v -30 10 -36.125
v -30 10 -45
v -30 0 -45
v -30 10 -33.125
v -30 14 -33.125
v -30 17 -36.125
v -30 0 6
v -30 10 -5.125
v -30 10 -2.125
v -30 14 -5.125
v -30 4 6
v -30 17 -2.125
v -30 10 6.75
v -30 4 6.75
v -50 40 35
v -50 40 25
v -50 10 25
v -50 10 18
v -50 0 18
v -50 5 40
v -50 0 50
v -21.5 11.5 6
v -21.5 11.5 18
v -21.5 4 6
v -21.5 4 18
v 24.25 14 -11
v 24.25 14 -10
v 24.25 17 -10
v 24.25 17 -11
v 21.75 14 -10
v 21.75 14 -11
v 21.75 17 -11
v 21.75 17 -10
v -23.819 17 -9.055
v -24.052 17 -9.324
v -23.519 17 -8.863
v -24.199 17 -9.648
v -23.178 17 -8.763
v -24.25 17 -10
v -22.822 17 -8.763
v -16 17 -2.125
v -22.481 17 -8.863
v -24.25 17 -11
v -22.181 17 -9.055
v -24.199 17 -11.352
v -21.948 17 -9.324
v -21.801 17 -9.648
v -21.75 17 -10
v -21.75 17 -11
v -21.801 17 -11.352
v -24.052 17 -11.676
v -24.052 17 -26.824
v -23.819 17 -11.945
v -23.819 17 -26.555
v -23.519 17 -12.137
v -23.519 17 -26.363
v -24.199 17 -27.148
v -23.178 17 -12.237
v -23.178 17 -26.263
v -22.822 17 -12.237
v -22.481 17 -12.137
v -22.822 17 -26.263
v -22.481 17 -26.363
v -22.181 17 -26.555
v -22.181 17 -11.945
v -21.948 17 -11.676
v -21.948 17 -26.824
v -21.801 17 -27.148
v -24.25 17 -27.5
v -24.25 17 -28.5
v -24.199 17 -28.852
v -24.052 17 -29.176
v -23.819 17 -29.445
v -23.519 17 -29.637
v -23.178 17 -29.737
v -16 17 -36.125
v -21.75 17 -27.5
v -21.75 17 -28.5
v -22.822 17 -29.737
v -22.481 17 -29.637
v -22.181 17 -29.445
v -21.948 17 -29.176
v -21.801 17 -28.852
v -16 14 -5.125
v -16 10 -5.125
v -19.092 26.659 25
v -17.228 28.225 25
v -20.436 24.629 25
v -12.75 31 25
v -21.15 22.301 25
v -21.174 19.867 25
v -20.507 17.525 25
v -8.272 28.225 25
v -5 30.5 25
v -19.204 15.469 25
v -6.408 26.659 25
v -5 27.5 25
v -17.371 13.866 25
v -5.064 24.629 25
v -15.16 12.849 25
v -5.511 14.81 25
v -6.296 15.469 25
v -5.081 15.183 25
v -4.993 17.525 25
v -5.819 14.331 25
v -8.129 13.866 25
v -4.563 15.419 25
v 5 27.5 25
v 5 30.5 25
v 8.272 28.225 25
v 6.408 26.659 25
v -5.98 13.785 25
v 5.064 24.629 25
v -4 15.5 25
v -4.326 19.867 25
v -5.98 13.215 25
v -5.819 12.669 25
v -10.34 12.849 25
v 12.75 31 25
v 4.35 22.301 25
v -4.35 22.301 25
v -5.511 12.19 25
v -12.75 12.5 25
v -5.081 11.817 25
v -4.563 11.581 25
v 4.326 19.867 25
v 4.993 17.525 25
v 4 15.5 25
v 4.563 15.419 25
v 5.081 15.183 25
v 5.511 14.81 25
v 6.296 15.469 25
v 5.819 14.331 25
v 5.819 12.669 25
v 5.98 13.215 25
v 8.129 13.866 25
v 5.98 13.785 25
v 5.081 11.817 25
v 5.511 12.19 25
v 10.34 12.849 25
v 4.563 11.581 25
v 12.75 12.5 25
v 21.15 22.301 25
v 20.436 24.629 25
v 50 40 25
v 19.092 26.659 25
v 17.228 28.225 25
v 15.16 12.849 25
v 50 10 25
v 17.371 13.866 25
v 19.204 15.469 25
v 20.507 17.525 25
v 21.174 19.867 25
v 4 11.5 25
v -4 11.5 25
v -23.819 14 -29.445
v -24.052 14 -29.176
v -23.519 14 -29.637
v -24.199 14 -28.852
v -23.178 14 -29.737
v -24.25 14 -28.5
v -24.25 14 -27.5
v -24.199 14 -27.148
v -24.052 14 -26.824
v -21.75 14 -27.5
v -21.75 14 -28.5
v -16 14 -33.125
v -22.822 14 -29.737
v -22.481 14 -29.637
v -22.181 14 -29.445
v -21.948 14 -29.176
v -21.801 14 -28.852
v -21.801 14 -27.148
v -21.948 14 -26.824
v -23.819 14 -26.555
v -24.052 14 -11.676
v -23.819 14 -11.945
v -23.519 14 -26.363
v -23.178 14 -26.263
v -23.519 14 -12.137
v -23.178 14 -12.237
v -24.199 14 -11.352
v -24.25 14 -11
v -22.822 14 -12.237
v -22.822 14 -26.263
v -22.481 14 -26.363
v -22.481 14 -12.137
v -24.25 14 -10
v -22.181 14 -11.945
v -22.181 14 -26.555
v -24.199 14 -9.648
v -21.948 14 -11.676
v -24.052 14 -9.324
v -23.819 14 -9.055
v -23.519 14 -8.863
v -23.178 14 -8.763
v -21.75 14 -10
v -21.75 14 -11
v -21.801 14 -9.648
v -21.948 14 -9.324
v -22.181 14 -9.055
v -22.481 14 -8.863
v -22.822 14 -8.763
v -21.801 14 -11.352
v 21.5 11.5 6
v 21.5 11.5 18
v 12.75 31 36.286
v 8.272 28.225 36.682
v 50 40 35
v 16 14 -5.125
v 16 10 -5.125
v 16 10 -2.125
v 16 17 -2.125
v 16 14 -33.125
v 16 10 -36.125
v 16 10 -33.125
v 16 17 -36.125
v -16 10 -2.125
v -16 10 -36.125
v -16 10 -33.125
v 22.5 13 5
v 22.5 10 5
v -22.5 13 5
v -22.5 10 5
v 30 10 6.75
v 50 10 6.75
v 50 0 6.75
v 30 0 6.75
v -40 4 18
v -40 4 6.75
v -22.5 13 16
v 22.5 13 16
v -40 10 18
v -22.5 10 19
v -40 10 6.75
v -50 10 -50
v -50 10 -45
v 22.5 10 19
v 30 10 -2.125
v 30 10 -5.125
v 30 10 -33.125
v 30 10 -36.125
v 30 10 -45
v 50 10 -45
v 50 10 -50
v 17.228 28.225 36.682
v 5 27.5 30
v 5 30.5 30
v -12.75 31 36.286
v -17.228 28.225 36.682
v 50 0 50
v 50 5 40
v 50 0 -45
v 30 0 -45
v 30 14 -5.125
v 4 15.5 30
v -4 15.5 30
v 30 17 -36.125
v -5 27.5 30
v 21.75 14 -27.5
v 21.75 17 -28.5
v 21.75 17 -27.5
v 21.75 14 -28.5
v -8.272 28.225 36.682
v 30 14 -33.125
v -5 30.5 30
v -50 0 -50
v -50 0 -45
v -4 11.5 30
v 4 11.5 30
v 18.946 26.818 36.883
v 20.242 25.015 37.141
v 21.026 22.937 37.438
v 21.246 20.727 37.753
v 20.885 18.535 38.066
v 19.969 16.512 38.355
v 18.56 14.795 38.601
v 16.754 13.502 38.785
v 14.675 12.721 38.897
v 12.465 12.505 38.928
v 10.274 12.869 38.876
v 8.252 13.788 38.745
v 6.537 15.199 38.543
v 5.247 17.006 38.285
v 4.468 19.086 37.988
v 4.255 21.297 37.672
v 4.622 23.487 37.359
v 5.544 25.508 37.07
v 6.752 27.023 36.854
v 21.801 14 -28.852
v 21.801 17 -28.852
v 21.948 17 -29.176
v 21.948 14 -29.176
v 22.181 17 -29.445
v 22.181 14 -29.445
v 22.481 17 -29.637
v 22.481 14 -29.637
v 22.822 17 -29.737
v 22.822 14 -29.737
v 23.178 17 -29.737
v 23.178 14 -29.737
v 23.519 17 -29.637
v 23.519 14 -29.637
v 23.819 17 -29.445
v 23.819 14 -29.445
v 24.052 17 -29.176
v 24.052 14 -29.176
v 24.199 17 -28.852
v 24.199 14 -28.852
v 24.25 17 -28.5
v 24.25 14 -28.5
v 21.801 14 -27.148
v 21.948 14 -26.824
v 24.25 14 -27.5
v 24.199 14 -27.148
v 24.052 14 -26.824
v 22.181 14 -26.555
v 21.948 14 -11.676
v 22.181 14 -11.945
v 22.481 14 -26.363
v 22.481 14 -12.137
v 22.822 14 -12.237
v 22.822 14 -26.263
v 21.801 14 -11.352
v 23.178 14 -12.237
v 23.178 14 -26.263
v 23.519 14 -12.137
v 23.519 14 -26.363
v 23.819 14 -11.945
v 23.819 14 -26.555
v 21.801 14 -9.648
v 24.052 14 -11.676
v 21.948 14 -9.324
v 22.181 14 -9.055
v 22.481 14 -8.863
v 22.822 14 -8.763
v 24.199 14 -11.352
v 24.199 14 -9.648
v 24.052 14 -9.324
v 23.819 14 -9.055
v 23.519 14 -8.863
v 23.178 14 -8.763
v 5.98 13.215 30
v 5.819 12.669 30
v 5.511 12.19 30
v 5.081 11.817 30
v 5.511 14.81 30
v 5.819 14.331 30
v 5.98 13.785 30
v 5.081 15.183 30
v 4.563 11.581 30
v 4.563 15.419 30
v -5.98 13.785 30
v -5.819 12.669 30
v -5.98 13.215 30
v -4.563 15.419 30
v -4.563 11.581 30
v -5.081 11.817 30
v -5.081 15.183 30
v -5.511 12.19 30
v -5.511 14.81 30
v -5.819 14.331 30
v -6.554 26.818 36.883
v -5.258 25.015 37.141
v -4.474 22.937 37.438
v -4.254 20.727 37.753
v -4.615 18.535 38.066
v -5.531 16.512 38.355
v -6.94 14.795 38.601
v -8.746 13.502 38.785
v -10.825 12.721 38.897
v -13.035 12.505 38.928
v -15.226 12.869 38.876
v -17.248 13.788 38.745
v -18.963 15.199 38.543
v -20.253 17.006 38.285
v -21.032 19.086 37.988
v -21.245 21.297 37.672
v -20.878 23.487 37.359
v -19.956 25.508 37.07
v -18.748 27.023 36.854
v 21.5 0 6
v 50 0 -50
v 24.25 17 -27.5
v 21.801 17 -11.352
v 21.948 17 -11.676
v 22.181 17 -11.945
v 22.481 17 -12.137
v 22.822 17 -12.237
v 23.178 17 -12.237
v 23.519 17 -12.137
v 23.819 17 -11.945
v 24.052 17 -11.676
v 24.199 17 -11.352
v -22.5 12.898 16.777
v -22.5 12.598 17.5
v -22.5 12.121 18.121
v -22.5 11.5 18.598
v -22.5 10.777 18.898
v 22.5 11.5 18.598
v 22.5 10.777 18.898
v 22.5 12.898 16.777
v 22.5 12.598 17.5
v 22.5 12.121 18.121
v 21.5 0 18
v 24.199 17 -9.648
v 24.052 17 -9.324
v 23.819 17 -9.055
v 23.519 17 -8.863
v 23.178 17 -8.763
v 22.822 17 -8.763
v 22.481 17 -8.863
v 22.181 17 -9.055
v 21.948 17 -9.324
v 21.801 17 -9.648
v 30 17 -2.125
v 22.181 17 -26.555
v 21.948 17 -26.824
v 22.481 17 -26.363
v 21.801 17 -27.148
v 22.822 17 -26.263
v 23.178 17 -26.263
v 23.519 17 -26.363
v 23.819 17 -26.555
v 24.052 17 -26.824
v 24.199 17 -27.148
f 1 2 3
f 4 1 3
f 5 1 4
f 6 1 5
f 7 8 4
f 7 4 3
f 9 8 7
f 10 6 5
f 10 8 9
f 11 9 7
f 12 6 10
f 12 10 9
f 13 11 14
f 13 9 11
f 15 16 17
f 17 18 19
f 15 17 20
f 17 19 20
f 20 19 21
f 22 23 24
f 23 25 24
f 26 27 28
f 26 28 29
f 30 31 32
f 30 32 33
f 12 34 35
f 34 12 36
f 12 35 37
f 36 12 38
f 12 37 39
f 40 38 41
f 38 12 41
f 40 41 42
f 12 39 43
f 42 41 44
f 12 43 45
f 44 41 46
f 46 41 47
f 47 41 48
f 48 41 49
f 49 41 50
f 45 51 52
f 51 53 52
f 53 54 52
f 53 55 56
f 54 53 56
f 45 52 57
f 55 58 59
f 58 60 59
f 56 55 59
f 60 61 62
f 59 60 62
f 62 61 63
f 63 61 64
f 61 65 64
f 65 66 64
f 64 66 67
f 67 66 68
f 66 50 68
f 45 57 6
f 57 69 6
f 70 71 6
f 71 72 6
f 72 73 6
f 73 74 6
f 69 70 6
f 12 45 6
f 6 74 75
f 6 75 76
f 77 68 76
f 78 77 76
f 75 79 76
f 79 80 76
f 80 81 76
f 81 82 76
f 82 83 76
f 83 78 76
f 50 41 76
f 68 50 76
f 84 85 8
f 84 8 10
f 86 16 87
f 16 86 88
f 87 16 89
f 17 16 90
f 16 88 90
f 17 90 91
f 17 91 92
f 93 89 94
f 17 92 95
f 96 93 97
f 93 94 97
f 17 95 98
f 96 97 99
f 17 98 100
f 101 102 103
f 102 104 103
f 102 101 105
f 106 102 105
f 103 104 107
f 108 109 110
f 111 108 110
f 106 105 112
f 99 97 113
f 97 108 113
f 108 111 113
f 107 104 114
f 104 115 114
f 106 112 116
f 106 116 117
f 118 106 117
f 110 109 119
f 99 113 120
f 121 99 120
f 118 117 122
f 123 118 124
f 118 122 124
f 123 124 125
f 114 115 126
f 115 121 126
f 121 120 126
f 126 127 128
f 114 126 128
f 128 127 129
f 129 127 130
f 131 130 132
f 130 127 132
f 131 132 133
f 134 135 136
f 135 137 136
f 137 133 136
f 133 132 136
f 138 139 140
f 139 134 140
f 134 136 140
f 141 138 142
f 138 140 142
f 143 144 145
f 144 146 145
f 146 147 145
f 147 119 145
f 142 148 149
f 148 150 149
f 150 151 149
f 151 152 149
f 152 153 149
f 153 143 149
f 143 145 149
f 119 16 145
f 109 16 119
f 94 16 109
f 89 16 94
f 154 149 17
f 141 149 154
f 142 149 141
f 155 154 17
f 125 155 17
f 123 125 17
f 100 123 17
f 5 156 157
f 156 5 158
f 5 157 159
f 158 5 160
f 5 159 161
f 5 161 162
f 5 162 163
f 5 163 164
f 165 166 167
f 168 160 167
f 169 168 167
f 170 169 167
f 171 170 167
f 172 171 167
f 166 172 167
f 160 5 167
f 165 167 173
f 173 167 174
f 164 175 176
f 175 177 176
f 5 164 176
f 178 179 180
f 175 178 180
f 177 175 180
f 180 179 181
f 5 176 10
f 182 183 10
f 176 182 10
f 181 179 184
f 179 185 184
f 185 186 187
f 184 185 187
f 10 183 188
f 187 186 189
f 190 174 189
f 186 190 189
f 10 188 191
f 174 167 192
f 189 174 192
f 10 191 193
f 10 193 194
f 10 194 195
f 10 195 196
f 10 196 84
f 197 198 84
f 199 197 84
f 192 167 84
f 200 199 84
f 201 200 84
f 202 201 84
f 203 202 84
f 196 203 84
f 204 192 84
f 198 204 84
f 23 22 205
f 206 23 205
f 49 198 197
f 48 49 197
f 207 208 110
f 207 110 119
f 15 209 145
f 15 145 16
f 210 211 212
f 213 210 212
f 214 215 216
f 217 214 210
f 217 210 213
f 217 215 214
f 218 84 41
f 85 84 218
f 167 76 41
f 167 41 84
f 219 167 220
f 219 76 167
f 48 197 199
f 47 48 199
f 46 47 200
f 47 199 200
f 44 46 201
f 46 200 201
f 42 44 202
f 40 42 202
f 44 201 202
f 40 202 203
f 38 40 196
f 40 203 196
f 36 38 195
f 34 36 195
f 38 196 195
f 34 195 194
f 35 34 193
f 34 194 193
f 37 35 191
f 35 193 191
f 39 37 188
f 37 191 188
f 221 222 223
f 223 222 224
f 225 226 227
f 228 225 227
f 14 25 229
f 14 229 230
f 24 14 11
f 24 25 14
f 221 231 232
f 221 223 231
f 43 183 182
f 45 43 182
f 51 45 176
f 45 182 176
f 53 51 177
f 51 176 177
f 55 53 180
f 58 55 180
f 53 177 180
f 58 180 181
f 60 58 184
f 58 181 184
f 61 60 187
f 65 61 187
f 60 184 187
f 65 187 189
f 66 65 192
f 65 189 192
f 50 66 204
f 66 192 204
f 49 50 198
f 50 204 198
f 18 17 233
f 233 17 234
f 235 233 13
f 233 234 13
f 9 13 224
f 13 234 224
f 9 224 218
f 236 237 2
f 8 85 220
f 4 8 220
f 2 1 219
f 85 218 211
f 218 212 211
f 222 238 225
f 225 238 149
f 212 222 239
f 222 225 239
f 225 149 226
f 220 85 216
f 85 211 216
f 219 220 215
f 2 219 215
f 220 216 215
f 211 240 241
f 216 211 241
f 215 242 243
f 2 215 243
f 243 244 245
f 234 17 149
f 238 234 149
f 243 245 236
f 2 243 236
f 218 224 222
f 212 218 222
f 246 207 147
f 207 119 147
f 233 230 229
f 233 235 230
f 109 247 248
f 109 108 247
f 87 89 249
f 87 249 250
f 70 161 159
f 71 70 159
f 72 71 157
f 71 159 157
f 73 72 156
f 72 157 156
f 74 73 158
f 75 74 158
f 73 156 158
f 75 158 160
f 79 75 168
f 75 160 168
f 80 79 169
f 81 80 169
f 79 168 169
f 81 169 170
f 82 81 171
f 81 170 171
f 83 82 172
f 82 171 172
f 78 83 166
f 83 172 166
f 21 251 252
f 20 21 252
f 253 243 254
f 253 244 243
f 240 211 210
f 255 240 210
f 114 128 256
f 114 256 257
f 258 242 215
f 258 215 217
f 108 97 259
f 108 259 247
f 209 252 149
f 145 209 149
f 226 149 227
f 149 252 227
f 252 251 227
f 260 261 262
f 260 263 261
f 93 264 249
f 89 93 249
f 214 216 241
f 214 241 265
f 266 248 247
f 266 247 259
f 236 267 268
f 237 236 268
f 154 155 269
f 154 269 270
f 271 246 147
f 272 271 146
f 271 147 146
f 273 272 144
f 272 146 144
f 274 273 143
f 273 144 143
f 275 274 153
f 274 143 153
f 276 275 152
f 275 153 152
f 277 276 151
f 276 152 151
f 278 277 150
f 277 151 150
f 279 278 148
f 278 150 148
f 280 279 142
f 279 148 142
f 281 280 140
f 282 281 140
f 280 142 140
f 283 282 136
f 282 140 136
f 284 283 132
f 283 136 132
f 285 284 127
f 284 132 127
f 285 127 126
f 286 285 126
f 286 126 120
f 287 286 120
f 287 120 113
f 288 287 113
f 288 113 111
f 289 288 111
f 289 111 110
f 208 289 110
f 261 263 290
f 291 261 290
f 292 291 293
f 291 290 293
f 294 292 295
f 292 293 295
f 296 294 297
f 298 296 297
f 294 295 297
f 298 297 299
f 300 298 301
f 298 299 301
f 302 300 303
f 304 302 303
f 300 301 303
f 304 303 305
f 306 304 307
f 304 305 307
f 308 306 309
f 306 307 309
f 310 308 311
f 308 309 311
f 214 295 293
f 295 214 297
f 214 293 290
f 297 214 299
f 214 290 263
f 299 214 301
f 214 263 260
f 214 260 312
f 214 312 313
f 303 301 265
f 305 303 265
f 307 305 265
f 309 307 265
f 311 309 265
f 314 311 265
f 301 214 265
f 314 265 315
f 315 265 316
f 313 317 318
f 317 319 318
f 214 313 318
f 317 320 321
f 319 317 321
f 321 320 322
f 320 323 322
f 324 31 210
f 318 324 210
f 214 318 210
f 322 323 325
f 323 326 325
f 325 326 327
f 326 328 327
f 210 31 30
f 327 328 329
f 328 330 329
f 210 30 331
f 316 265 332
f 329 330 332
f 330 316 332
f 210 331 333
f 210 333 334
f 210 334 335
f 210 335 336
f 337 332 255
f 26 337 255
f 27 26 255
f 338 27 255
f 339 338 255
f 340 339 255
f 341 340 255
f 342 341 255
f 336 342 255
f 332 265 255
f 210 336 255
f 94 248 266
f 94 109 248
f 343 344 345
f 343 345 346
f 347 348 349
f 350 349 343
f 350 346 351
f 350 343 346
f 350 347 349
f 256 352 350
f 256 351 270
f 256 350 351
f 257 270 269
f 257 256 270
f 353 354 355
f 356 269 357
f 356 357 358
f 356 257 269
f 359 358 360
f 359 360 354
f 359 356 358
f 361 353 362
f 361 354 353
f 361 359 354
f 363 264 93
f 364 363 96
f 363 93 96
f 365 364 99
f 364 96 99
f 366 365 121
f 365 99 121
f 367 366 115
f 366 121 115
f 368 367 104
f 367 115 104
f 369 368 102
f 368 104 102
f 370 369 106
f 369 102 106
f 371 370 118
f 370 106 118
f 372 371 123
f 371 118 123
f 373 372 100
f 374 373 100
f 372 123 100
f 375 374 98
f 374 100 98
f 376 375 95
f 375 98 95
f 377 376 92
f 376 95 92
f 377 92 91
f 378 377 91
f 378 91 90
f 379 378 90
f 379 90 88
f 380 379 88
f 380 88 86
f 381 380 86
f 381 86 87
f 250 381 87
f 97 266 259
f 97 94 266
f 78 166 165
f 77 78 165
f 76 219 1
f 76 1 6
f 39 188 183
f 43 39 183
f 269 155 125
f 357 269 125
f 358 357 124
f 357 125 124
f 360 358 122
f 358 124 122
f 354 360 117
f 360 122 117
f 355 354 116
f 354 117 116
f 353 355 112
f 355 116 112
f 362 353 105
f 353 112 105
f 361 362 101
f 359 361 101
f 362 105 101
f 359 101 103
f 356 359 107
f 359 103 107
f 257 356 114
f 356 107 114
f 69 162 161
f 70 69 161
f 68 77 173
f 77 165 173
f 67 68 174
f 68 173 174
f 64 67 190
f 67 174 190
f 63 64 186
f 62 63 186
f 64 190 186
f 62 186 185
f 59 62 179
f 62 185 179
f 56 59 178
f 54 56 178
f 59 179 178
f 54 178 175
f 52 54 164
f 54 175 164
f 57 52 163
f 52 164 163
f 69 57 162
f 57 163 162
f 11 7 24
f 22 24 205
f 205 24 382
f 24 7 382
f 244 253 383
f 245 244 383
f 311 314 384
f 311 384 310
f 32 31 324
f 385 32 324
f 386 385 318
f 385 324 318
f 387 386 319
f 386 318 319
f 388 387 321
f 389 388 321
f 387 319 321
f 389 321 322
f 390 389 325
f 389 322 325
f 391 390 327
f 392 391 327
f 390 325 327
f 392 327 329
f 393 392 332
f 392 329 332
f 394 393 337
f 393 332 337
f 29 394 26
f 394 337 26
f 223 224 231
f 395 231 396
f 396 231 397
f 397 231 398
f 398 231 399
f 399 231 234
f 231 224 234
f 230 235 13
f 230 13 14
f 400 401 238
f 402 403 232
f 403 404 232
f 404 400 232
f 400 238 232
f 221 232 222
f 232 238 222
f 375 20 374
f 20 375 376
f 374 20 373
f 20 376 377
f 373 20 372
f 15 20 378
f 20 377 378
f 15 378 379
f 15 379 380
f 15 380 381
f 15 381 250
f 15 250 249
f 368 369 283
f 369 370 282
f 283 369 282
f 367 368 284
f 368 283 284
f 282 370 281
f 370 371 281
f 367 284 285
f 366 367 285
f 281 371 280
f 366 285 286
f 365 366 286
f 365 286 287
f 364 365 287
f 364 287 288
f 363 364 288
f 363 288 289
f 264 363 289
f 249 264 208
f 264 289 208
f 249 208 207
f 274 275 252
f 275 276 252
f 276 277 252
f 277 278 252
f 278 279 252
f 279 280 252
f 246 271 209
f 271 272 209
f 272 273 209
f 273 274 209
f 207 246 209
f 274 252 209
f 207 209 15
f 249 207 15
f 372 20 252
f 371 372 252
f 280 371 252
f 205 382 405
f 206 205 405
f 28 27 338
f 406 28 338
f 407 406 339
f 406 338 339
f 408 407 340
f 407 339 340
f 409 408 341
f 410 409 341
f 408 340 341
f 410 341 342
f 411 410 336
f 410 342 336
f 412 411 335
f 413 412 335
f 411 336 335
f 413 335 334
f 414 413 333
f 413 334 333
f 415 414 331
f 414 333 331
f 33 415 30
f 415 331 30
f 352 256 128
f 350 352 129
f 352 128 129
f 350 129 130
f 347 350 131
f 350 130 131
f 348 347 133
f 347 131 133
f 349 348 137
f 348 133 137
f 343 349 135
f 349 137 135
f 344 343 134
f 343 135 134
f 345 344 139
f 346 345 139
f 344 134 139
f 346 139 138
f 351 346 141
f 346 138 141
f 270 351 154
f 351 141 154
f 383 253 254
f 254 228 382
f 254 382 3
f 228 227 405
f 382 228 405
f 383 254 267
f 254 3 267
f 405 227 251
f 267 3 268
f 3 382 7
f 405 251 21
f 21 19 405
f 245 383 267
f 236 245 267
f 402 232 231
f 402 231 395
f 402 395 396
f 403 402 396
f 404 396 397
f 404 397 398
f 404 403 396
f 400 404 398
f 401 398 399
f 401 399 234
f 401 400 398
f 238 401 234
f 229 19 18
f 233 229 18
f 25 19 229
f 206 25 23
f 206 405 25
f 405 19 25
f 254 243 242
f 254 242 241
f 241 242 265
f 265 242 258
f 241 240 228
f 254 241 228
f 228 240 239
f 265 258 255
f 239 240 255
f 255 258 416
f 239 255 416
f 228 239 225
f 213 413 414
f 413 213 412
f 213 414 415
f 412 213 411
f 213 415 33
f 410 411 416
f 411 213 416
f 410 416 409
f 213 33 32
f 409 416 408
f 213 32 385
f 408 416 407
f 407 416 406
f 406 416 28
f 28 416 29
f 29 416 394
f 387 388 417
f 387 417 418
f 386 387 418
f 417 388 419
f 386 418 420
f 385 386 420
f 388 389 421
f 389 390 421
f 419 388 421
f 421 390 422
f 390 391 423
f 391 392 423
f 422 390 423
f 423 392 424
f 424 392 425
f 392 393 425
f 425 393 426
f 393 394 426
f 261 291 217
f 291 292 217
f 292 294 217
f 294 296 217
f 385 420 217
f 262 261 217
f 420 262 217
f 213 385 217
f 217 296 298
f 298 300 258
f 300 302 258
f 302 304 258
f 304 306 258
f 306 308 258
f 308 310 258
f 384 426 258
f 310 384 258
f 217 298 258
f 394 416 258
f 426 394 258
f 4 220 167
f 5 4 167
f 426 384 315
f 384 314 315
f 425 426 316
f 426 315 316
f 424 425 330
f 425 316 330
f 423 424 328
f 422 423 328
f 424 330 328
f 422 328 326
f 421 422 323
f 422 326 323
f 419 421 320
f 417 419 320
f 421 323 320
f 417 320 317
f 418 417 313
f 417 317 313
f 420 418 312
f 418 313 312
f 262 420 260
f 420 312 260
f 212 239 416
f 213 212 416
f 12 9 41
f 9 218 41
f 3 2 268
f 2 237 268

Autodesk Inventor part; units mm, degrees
ref_plane "YZ Plane" through (0, 0, 0) normal (1, 0, 0) x (0, 1, 0)
ref_plane "XZ Plane" through (0, 0, 0) normal (0, 1, 0) x (-1, 0, 0)
ref_plane "XY Plane" through (0, 0, 0) normal (0, 0, 1) x (1, 0, 0)
sketch "Sketch3" plane through (0, 0, 0) normal (0, 1, 0) x (-1, 0, 0)
  line L0 (50, 50) -> (-50, 50)
  line L1 (-50, 50) -> (-50, -50)
  line L2 (-50, -50) -> (50, -50)
  line L3 (50, -50) -> (50, 50)
  line L4 (50, 50) -> (-50, -50) construction
  line L5 (-50, 50) -> (50, -50) construction
  line L6 (45, -45) -> (-45, 45) construction
  line L7 (-45, -45) -> (45, 45) construction
  point P0 (0, 0)
  dimension "d12" = 100
  dimension "d13" = 100
extrude "Solid Mass" add sketch "Sketch3" along normal blind 40
sketch "Sketch6" plane through (50, 0, 50) normal (1, 0, 0) x (0, 0, -1)
  line L0 (0, 0) -> (100, 0) projected
  line L1 (0, 0) -> (10, 5)
  line L2 (10, 5) -> (15, 40)
  line L3 (0, 40) -> (100, 40) projected
  line L4 (0, 0) -> (0, 40)
  line L5 (100, 40) -> (25, 40)
  line L6 (25, 40) -> (25, 10)
  line L7 (25, 10) -> (100, 10)
  line L8 (100, 10) -> (100, 40)
  circle A0 centre (69.125, 22) radius 22.5
  line L9 (63.125, 17) -> (75.125, 17)
  line L10 (75.125, 17) -> (75.125, 27)
  line L11 (75.125, 27) -> (63.125, 27)
  line L12 (63.125, 27) -> (63.125, 17)
  line L13 (63.125, 17) -> (75.125, 27) construction
  line L14 (75.125, 17) -> (63.125, 27) construction
  line L15 (100, 0) -> (100, 40) projected
  line L16 (52.125, 10) -> (52.125, 17)
  line L17 (55.125, 10) -> (55.125, 14)
  line L18 (55.125, 14) -> (63.125, 14)
  line L19 (63.125, 14) -> (63.125, 10)
  line L20 (69.125, 22) -> (69.125, 0)
  line L21 (52.125, 17) -> (69.125, 17)
  line L22 (86.125, 10) -> (86.125, 17)
  line L23 (83.125, 10) -> (83.125, 14)
  line L24 (83.125, 14) -> (75.125, 14)
  line L25 (75.125, 14) -> (75.125, 10)
  line L26 (86.125, 17) -> (69.125, 17)
  point P0 (50, 0)
  point P1 (25, 40)
  point P2 (82.625, 40)
  point P3 (88.1579, 10)
  point P4 (64.408, 0)
  point P5 (50.0921, 10)
  point P6 (67.25, 14)
  point P7 (55.625, 40)
  point P8 (55.25, 14)
  point P9 (73.842, 0)
  point P10 (75.125, 10)
  point P11 (83.125, 10)
  point P12 (86.125, 10)
  point P13 (75.125, 17)
  dimension "d20" = 10
  dimension "d21" = 5
  dimension "d22" = 15
  dimension "d25" = 10
  dimension "d27" = 45
  dimension "d28" = 12
  dimension "d29" = 10
  dimension "d35" = 15
  dimension "d45" = 22
  dimension "d47" = 30.875
  dimension "d48" = 3
  dimension "d49" = 3
  dimension "d50" = 11
extrude "Cut Ramp" cut sketch "Sketch6" against normal through all contours L4 L3 L2 L1 | A0 L3 L7 L22 L26 L10 L11 L12 L21 L16 | L7 L6 L3 A0 | L20 L9 L26 L22 L7 L23 L24 L25 | L7 L19 L18 L17 L16 L21 L9 L20 | A0 L3 L8 L7 | L7 L17 L18 L19 | L25 L24 L23 L7 | L9 L12 L11 L10
sketch "Sketch7" plane through (50, 10, 25) normal (0, 0, -1) x (-1, 0, 0)
  circle A0 centre (62.75, 11) radius 8.5
  line L0 (100, 0) -> (0, 0) projected
  line L1 (0, 30) -> (100, 30) projected
  line L2 (0, 0) -> (0, 30) projected
  line L3 (0, -10) -> (0, 0) projected
  line L4 (100, -10) -> (100, 0) projected
  line L5 (100, 30) -> (100, 0) projected
  line L6 (0, -10) -> (100, -10) projected
  line L7 (50, 30) -> (50, 0)
  circle A1 centre (37.25, 11) radius 8.5
  line L8 (58.2723, 18.225) -> (62.75, 21)
  line L9 (62.75, 21) -> (67.2277, 18.225)
  line L10 (41.7277, 18.225) -> (37.25, 21)
  line L11 (37.25, 21) -> (32.7723, 18.225)
  point P0 (50, -10)
  point P1 (32.7723, 18.225)
  point P2 (41.7277, 18.225)
  dimension "d30" = 17
  dimension "d31" = 11
  dimension "d32" = 25.5
  dimension "d46" = 10
extrude "Eyes" cut sketch "Sketch7" against normal through all contours A0 | A0 L8 L9 | A1 | A1 L11 L10
extrude "Motor Platform" add sketch "Sketch6" against normal up to surface (100 mm away) contours L20 L9 L26 L22 L7 L23 L24 L25 | L7 L19 L18 L17 L16 L21 L9 L20
sketch "Sketch9" plane through (-50, 0, -50) normal (-1, 0, 0) x (0, 0, 1)
  line L0 (5, 22) -> (5, 0)
  line L1 (56.75, 22) -> (56.75, 0)
  arc A0 (56.75, 22) -> (5, 22) centre (30.875, 22) ccw
  line L2 (5, 0) -> (56.75, 0)
  line L3 (0, 10) -> (13.875, 10) projected
  line L4 (24.875, 17) -> (24.875, 27) projected
  line L5 (24.875, 27) -> (36.875, 27) projected
  line L6 (36.875, 27) -> (36.875, 17) projected
  line L7 (13.875, 17) -> (47.875, 17) projected
  line L8 (13.875, 10) -> (0, 10) projected
  circle A1 centre (30.875, 22) radius 22.5 projected
  line L9 (0, 0) -> (100, 0) projected
  line L10 (0, 0) -> (0, 10) projected
  point P0 (50, 0)
  point P1 (5, 10)
  point P2 (26.158, 0)
  point P3 (11.8421, 10)
  point P4 (35.592, 0)
  dimension "d54" = 5
  dimension "d55" = 51.75
  dimension "d56" = 22
extrude "Cut right wheel" cut sketch "Sketch9" against normal blind 20 contours A0 L1 L2 A1 L3 L0 | L3 A1 L2 L0 | A1 L2 | L4 L5 L6 L7 picked at (31.5427, 32.8036)
extrude "Cut left wheel" cut sketch "Sketch9" along normal blind 20 from surface at -100 contours A0 L1 L2 A1 L3 L0 | L3 A1 L2 L0 | A1 L2 | L4 L5 L6 L7 picked at (31.5427, 32.8036)
sketch "Sketch8" plane through (50, 10, 25) normal (0, 1, 0) x (1, 0, 0)
  line L0 (-27, 35) -> (-27, 36) construction
  line L1 (-25.75, 35) -> (-25.75, 36)
  line L2 (-28.25, 36) -> (-28.25, 35)
  arc A0 (-28.25, 35) -> (-25.75, 35) centre (-27, 35) ccw
  arc A1 (-25.75, 36) -> (-28.25, 36) centre (-27, 36) ccw
  line L3 (-27, 52.5) -> (-27, 53.5) construction
  line L4 (-25.75, 52.5) -> (-25.75, 53.5)
  line L5 (-28.25, 53.5) -> (-28.25, 52.5)
  arc A2 (-28.25, 52.5) -> (-25.75, 52.5) centre (-27, 52.5) ccw
  arc A3 (-25.75, 53.5) -> (-28.25, 53.5) centre (-27, 53.5) ccw
  line L6 (-100, 0) -> (-100, 18.25) projected
  line L7 (0, 0) -> (-100, 0) projected
  line L8 (0, 75) -> (0, 70) projected
  line L9 (-100, 75) -> (0, 75) projected
  line L10 (-100, 75) -> (0, 75) projected
  line L11 (-50, 75) -> (-50, 0)
  line L12 (-73, 35) -> (-73, 36) construction
  line L13 (-74.25, 35) -> (-74.25, 36)
  line L14 (-71.75, 36) -> (-71.75, 35)
  arc A4 (-74.25, 35) -> (-71.75, 35) centre (-73, 35) ccw
  arc A5 (-71.75, 36) -> (-74.25, 36) centre (-73, 36) ccw
  line L15 (-73, 52.5) -> (-73, 53.5) construction
  line L16 (-74.25, 52.5) -> (-74.25, 53.5)
  line L17 (-71.75, 53.5) -> (-71.75, 52.5)
  arc A6 (-74.25, 52.5) -> (-71.75, 52.5) centre (-73, 52.5) ccw
  arc A7 (-71.75, 53.5) -> (-74.25, 53.5) centre (-73, 53.5) ccw
  line L18 (0, 0) -> (-100, 0) projected
  line L19 (-27, 0) -> (-27, 75) construction
  line L20 (-80, 18.25) -> (-100, 18.25) projected
  line L21 (0, 18.25) -> (0, 0) projected
  line L22 (0, 18.25) -> (-20, 18.25) projected
  line L23 (-20, 27.125) -> (-20, 18.25) projected
  line L24 (-20, 27.125) -> (-80, 27.125) projected
  line L25 (-80, 27.125) -> (-80, 18.25) projected
  line L26 (-100, 70) -> (-100, 75) projected
  line L27 (-100, 70) -> (-80, 70) projected
  line L28 (-80, 70) -> (-80, 61.125) projected
  line L29 (-80, 61.125) -> (-20, 61.125) projected
  line L30 (-20, 70) -> (-20, 61.125) projected
  line L31 (-20, 70) -> (0, 70) projected
  point P0 (-50, 25)
  point P1 (-27, 35.5)
  point P2 (-27, 53)
  point P3 (-73, 35.5)
  point P4 (-73, 53)
  point P5 (-50, 61.125)
  point P6 (-50, 27.125)
  dimension "d36" = 17.5
  dimension "d37" = 1.25
  dimension "d38" = 1
  dimension "d40" = 27
  dimension "d41" = 22
extrude "Cut Motor Bolt Holes" cut sketch "Sketch8" along normal blind 20 contours A0 L2 A1 L1 | A2 L5 A3 L4 | L13 A5 L14 A4 | L16 A7 L17 A6
sketch "Sketch10" plane through (-30, 10, -36.125) normal (0, 0, -1) x (-1, 0, 0)
  line L0 (-60, 0) -> (-60, 7) projected
  line L1 (-60, 7) -> (0, 7) projected
  line L2 (0, 0) -> (0, 7) projected
  line L3 (0, 0) -> (-60, 0) projected
  line L4 (-46, 7) -> (-14, 7)
  line L5 (-14, 7) -> (-14, 0)
  line L6 (-14, 0) -> (-46, 0)
  line L7 (-46, 0) -> (-46, 7)
  point P0 (-30, -10)
  point P1 (-46, 0)
  dimension "d61" = 14
  dimension "d62" = 14
extrude "Cut Centre" cut sketch "Sketch10" against normal up to surface (34 mm away) contours L7 L1 L5 L3
sketch "Sketch12" plane through (0, 0, 0) normal (0, -1, 0) x (1, 0, 0)
  line L0 (50, 25) -> (-50, 25) projected
  line L1 (-21.5, 18) -> (21.5, 18)
  line L2 (21.5, 18) -> (21.5, 6)
  line L3 (21.5, 6) -> (-21.5, 6)
  line L4 (-21.5, 6) -> (-21.5, 18)
  point P0 (0, 0)
  point P1 (0, 6)
  dimension "d72" = 43
  dimension "d73" = 12
  dimension "d74" = 7
extrude "Extrusion13" cut sketch "Sketch12" against normal blind 10
sketch "Sketch13" plane through (50, 10, 25) normal (0, 0, -1) x (-1, 0, 0)
  line L0 (27.25, 21) -> (72.75, 21)
  line L1 (72.75, 21) -> (72.75, 1)
  line L2 (72.75, 1) -> (27.25, 1)
  line L3 (27.25, 1) -> (27.25, 21)
  arc A0 (58.2723, 18.225) -> (67.2277, 18.225) centre (62.75, 11) ccw projected
  circle A1 centre (62.75, 11) radius 10 construction
  arc A2 (32.7723, 18.225) -> (41.7277, 18.225) centre (37.25, 11) ccw projected
  circle A3 centre (37.25, 11) radius 10 construction
  line L4 (44, 5.5) -> (56, 5.5)
  line L5 (56, 5.5) -> (56, 1.5)
  line L6 (56, 1.5) -> (44, 1.5)
  line L7 (44, 1.5) -> (44, 5.5)
  circle A4 centre (54, 3.5) radius 2
  circle A5 centre (46, 3.5) radius 2
  line L8 (45, 20.5) -> (55, 20.5)
  line L9 (55, 20.5) -> (55, 17.5)
  line L10 (55, 17.5) -> (45, 17.5)
  line L11 (45, 17.5) -> (45, 20.5)
  point P0 (50, -10)
  point P1 (50, 5.5)
  point P2 (50, 1)
  point P3 (50, 20.5)
  point P4 (50, 21)
  point P5 (46, 1.5)
  point P6 (54, 1.5)
  point P7 (54, 5.5)
  point P8 (46, 5.5)
  dimension "d75" = 20
  dimension "d76" = 20
  dimension "d77" = 20
  dimension "d78" = 12
  dimension "d79" = 4
  dimension "d80" = 0.5
  dimension "d81" = 10
  dimension "d82" = 3
  dimension "d83" = 0.5
extrude "Extrusion14" cut sketch "Sketch13" against normal blind 5 contours L4 A4 L6 A5 | A5 | A4 | L8 L9 L10 L11
sketch "Sketch16" plane through (-21.5, 0, 18) normal (1, 0, 0) x (0, 0, -1)
  line L0 (12, 0) -> (12, 10) projected
  line L1 (0, 0) -> (0, 10) projected
  line L2 (12, 0) -> (0, 0)
  line L3 (0, 0) -> (0, 4)
  line L4 (0, 4) -> (12, 4)
  line L5 (12, 4) -> (12, 0)
  point P0 (18, 0)
  dimension "d89" = 4
extrude "Extrusion16" cut sketch "Sketch16" against normal blind 34
sketch "Sketch17" plane through (-50, 10, 25) normal (0, 1, 0) x (1, 0, 0)
  line L0 (20, 18.25) -> (0, 18.25) projected
  line L1 (0, 7) -> (71.5, 7) projected
  line L2 (0, 18.25) -> (10, 18.25)
  line L3 (10, 18.25) -> (10, 7)
  line L4 (10, 7) -> (0, 7)
  line L5 (0, 7) -> (0, 18.25)
  point P0 (50, 25)
  dimension "d92" = 10
extrude "Extrusion17" cut sketch "Sketch17" against normal blind 34
sketch "Sketch18" plane through (-50, 10, 25) normal (0, 1, 0) x (1, 0, 0)
  line L0 (71.5, 7) -> (28.5, 7) projected
  line L1 (71.5, 19) -> (71.5, 7) projected
  line L2 (28.5, 19) -> (71.5, 19) projected
  line L3 (28.5, 7) -> (28.5, 19) projected
  line L4 (27.5, 6) -> (72.5, 6)
  line L5 (72.5, 6) -> (72.5, 20)
  line L6 (72.5, 20) -> (27.5, 20)
  line L7 (27.5, 20) -> (27.5, 6)
  point P0 (50, 25)
  dimension "d95" = 1
extrude "Extrusion18" add sketch "Sketch18" along normal blind 3
sketch "Sketch19" plane through (-50, 13, 25) normal (0, 1, 0) x (1, 0, 0)
  line L0 (28.5, 7) -> (28.5, 19) projected
  line L1 (71.5, 7) -> (28.5, 7)
  line L2 (28.5, 7) -> (28.5, 19)
  line L3 (28.5, 19) -> (71.5, 19)
  line L4 (71.5, 19) -> (71.5, 7)
  point P0 (50, 25)
  point P1 (28.5, 7)
extrude "Extrusion19" add sketch "Sketch19" against normal blind 1.5
sketch "Sketch20" plane through (-30, 0, -50) normal (-1, 0, 0) x (0, 0, 1)
  line L0 (24.875, 14) -> (16.875, 14) projected
  line L1 (36.875, 10) -> (44.875, 10) projected
  line L2 (24.875, 14) -> (36.875, 14)
  line L3 (36.875, 14) -> (36.875, 10)
  line L4 (36.875, 10) -> (24.875, 10)
  line L5 (24.875, 10) -> (24.875, 14)
  point P0 (50, 0)
extrude "Extrusion20" cut sketch "Sketch20" against normal blind 100
fillet "Fillet1" radius 3 1 edges at (0, 13, 19)
sketch "Sketch21" plane through (-50, 10, -50) normal (0, 1, 0) x (1, 0, 0)
  line L0 (59.9918, -13.8859) -> (42.201, -13.8859)
  line L1 (42.201, -13.8859) -> (42.201, -46.4739)
  line L2 (42.201, -46.4739) -> (59.9918, -46.4739)
  line L3 (59.9918, -46.4739) -> (59.9918, -13.8859)
  point P0 (50, -50)
properties part number "shell_01"
